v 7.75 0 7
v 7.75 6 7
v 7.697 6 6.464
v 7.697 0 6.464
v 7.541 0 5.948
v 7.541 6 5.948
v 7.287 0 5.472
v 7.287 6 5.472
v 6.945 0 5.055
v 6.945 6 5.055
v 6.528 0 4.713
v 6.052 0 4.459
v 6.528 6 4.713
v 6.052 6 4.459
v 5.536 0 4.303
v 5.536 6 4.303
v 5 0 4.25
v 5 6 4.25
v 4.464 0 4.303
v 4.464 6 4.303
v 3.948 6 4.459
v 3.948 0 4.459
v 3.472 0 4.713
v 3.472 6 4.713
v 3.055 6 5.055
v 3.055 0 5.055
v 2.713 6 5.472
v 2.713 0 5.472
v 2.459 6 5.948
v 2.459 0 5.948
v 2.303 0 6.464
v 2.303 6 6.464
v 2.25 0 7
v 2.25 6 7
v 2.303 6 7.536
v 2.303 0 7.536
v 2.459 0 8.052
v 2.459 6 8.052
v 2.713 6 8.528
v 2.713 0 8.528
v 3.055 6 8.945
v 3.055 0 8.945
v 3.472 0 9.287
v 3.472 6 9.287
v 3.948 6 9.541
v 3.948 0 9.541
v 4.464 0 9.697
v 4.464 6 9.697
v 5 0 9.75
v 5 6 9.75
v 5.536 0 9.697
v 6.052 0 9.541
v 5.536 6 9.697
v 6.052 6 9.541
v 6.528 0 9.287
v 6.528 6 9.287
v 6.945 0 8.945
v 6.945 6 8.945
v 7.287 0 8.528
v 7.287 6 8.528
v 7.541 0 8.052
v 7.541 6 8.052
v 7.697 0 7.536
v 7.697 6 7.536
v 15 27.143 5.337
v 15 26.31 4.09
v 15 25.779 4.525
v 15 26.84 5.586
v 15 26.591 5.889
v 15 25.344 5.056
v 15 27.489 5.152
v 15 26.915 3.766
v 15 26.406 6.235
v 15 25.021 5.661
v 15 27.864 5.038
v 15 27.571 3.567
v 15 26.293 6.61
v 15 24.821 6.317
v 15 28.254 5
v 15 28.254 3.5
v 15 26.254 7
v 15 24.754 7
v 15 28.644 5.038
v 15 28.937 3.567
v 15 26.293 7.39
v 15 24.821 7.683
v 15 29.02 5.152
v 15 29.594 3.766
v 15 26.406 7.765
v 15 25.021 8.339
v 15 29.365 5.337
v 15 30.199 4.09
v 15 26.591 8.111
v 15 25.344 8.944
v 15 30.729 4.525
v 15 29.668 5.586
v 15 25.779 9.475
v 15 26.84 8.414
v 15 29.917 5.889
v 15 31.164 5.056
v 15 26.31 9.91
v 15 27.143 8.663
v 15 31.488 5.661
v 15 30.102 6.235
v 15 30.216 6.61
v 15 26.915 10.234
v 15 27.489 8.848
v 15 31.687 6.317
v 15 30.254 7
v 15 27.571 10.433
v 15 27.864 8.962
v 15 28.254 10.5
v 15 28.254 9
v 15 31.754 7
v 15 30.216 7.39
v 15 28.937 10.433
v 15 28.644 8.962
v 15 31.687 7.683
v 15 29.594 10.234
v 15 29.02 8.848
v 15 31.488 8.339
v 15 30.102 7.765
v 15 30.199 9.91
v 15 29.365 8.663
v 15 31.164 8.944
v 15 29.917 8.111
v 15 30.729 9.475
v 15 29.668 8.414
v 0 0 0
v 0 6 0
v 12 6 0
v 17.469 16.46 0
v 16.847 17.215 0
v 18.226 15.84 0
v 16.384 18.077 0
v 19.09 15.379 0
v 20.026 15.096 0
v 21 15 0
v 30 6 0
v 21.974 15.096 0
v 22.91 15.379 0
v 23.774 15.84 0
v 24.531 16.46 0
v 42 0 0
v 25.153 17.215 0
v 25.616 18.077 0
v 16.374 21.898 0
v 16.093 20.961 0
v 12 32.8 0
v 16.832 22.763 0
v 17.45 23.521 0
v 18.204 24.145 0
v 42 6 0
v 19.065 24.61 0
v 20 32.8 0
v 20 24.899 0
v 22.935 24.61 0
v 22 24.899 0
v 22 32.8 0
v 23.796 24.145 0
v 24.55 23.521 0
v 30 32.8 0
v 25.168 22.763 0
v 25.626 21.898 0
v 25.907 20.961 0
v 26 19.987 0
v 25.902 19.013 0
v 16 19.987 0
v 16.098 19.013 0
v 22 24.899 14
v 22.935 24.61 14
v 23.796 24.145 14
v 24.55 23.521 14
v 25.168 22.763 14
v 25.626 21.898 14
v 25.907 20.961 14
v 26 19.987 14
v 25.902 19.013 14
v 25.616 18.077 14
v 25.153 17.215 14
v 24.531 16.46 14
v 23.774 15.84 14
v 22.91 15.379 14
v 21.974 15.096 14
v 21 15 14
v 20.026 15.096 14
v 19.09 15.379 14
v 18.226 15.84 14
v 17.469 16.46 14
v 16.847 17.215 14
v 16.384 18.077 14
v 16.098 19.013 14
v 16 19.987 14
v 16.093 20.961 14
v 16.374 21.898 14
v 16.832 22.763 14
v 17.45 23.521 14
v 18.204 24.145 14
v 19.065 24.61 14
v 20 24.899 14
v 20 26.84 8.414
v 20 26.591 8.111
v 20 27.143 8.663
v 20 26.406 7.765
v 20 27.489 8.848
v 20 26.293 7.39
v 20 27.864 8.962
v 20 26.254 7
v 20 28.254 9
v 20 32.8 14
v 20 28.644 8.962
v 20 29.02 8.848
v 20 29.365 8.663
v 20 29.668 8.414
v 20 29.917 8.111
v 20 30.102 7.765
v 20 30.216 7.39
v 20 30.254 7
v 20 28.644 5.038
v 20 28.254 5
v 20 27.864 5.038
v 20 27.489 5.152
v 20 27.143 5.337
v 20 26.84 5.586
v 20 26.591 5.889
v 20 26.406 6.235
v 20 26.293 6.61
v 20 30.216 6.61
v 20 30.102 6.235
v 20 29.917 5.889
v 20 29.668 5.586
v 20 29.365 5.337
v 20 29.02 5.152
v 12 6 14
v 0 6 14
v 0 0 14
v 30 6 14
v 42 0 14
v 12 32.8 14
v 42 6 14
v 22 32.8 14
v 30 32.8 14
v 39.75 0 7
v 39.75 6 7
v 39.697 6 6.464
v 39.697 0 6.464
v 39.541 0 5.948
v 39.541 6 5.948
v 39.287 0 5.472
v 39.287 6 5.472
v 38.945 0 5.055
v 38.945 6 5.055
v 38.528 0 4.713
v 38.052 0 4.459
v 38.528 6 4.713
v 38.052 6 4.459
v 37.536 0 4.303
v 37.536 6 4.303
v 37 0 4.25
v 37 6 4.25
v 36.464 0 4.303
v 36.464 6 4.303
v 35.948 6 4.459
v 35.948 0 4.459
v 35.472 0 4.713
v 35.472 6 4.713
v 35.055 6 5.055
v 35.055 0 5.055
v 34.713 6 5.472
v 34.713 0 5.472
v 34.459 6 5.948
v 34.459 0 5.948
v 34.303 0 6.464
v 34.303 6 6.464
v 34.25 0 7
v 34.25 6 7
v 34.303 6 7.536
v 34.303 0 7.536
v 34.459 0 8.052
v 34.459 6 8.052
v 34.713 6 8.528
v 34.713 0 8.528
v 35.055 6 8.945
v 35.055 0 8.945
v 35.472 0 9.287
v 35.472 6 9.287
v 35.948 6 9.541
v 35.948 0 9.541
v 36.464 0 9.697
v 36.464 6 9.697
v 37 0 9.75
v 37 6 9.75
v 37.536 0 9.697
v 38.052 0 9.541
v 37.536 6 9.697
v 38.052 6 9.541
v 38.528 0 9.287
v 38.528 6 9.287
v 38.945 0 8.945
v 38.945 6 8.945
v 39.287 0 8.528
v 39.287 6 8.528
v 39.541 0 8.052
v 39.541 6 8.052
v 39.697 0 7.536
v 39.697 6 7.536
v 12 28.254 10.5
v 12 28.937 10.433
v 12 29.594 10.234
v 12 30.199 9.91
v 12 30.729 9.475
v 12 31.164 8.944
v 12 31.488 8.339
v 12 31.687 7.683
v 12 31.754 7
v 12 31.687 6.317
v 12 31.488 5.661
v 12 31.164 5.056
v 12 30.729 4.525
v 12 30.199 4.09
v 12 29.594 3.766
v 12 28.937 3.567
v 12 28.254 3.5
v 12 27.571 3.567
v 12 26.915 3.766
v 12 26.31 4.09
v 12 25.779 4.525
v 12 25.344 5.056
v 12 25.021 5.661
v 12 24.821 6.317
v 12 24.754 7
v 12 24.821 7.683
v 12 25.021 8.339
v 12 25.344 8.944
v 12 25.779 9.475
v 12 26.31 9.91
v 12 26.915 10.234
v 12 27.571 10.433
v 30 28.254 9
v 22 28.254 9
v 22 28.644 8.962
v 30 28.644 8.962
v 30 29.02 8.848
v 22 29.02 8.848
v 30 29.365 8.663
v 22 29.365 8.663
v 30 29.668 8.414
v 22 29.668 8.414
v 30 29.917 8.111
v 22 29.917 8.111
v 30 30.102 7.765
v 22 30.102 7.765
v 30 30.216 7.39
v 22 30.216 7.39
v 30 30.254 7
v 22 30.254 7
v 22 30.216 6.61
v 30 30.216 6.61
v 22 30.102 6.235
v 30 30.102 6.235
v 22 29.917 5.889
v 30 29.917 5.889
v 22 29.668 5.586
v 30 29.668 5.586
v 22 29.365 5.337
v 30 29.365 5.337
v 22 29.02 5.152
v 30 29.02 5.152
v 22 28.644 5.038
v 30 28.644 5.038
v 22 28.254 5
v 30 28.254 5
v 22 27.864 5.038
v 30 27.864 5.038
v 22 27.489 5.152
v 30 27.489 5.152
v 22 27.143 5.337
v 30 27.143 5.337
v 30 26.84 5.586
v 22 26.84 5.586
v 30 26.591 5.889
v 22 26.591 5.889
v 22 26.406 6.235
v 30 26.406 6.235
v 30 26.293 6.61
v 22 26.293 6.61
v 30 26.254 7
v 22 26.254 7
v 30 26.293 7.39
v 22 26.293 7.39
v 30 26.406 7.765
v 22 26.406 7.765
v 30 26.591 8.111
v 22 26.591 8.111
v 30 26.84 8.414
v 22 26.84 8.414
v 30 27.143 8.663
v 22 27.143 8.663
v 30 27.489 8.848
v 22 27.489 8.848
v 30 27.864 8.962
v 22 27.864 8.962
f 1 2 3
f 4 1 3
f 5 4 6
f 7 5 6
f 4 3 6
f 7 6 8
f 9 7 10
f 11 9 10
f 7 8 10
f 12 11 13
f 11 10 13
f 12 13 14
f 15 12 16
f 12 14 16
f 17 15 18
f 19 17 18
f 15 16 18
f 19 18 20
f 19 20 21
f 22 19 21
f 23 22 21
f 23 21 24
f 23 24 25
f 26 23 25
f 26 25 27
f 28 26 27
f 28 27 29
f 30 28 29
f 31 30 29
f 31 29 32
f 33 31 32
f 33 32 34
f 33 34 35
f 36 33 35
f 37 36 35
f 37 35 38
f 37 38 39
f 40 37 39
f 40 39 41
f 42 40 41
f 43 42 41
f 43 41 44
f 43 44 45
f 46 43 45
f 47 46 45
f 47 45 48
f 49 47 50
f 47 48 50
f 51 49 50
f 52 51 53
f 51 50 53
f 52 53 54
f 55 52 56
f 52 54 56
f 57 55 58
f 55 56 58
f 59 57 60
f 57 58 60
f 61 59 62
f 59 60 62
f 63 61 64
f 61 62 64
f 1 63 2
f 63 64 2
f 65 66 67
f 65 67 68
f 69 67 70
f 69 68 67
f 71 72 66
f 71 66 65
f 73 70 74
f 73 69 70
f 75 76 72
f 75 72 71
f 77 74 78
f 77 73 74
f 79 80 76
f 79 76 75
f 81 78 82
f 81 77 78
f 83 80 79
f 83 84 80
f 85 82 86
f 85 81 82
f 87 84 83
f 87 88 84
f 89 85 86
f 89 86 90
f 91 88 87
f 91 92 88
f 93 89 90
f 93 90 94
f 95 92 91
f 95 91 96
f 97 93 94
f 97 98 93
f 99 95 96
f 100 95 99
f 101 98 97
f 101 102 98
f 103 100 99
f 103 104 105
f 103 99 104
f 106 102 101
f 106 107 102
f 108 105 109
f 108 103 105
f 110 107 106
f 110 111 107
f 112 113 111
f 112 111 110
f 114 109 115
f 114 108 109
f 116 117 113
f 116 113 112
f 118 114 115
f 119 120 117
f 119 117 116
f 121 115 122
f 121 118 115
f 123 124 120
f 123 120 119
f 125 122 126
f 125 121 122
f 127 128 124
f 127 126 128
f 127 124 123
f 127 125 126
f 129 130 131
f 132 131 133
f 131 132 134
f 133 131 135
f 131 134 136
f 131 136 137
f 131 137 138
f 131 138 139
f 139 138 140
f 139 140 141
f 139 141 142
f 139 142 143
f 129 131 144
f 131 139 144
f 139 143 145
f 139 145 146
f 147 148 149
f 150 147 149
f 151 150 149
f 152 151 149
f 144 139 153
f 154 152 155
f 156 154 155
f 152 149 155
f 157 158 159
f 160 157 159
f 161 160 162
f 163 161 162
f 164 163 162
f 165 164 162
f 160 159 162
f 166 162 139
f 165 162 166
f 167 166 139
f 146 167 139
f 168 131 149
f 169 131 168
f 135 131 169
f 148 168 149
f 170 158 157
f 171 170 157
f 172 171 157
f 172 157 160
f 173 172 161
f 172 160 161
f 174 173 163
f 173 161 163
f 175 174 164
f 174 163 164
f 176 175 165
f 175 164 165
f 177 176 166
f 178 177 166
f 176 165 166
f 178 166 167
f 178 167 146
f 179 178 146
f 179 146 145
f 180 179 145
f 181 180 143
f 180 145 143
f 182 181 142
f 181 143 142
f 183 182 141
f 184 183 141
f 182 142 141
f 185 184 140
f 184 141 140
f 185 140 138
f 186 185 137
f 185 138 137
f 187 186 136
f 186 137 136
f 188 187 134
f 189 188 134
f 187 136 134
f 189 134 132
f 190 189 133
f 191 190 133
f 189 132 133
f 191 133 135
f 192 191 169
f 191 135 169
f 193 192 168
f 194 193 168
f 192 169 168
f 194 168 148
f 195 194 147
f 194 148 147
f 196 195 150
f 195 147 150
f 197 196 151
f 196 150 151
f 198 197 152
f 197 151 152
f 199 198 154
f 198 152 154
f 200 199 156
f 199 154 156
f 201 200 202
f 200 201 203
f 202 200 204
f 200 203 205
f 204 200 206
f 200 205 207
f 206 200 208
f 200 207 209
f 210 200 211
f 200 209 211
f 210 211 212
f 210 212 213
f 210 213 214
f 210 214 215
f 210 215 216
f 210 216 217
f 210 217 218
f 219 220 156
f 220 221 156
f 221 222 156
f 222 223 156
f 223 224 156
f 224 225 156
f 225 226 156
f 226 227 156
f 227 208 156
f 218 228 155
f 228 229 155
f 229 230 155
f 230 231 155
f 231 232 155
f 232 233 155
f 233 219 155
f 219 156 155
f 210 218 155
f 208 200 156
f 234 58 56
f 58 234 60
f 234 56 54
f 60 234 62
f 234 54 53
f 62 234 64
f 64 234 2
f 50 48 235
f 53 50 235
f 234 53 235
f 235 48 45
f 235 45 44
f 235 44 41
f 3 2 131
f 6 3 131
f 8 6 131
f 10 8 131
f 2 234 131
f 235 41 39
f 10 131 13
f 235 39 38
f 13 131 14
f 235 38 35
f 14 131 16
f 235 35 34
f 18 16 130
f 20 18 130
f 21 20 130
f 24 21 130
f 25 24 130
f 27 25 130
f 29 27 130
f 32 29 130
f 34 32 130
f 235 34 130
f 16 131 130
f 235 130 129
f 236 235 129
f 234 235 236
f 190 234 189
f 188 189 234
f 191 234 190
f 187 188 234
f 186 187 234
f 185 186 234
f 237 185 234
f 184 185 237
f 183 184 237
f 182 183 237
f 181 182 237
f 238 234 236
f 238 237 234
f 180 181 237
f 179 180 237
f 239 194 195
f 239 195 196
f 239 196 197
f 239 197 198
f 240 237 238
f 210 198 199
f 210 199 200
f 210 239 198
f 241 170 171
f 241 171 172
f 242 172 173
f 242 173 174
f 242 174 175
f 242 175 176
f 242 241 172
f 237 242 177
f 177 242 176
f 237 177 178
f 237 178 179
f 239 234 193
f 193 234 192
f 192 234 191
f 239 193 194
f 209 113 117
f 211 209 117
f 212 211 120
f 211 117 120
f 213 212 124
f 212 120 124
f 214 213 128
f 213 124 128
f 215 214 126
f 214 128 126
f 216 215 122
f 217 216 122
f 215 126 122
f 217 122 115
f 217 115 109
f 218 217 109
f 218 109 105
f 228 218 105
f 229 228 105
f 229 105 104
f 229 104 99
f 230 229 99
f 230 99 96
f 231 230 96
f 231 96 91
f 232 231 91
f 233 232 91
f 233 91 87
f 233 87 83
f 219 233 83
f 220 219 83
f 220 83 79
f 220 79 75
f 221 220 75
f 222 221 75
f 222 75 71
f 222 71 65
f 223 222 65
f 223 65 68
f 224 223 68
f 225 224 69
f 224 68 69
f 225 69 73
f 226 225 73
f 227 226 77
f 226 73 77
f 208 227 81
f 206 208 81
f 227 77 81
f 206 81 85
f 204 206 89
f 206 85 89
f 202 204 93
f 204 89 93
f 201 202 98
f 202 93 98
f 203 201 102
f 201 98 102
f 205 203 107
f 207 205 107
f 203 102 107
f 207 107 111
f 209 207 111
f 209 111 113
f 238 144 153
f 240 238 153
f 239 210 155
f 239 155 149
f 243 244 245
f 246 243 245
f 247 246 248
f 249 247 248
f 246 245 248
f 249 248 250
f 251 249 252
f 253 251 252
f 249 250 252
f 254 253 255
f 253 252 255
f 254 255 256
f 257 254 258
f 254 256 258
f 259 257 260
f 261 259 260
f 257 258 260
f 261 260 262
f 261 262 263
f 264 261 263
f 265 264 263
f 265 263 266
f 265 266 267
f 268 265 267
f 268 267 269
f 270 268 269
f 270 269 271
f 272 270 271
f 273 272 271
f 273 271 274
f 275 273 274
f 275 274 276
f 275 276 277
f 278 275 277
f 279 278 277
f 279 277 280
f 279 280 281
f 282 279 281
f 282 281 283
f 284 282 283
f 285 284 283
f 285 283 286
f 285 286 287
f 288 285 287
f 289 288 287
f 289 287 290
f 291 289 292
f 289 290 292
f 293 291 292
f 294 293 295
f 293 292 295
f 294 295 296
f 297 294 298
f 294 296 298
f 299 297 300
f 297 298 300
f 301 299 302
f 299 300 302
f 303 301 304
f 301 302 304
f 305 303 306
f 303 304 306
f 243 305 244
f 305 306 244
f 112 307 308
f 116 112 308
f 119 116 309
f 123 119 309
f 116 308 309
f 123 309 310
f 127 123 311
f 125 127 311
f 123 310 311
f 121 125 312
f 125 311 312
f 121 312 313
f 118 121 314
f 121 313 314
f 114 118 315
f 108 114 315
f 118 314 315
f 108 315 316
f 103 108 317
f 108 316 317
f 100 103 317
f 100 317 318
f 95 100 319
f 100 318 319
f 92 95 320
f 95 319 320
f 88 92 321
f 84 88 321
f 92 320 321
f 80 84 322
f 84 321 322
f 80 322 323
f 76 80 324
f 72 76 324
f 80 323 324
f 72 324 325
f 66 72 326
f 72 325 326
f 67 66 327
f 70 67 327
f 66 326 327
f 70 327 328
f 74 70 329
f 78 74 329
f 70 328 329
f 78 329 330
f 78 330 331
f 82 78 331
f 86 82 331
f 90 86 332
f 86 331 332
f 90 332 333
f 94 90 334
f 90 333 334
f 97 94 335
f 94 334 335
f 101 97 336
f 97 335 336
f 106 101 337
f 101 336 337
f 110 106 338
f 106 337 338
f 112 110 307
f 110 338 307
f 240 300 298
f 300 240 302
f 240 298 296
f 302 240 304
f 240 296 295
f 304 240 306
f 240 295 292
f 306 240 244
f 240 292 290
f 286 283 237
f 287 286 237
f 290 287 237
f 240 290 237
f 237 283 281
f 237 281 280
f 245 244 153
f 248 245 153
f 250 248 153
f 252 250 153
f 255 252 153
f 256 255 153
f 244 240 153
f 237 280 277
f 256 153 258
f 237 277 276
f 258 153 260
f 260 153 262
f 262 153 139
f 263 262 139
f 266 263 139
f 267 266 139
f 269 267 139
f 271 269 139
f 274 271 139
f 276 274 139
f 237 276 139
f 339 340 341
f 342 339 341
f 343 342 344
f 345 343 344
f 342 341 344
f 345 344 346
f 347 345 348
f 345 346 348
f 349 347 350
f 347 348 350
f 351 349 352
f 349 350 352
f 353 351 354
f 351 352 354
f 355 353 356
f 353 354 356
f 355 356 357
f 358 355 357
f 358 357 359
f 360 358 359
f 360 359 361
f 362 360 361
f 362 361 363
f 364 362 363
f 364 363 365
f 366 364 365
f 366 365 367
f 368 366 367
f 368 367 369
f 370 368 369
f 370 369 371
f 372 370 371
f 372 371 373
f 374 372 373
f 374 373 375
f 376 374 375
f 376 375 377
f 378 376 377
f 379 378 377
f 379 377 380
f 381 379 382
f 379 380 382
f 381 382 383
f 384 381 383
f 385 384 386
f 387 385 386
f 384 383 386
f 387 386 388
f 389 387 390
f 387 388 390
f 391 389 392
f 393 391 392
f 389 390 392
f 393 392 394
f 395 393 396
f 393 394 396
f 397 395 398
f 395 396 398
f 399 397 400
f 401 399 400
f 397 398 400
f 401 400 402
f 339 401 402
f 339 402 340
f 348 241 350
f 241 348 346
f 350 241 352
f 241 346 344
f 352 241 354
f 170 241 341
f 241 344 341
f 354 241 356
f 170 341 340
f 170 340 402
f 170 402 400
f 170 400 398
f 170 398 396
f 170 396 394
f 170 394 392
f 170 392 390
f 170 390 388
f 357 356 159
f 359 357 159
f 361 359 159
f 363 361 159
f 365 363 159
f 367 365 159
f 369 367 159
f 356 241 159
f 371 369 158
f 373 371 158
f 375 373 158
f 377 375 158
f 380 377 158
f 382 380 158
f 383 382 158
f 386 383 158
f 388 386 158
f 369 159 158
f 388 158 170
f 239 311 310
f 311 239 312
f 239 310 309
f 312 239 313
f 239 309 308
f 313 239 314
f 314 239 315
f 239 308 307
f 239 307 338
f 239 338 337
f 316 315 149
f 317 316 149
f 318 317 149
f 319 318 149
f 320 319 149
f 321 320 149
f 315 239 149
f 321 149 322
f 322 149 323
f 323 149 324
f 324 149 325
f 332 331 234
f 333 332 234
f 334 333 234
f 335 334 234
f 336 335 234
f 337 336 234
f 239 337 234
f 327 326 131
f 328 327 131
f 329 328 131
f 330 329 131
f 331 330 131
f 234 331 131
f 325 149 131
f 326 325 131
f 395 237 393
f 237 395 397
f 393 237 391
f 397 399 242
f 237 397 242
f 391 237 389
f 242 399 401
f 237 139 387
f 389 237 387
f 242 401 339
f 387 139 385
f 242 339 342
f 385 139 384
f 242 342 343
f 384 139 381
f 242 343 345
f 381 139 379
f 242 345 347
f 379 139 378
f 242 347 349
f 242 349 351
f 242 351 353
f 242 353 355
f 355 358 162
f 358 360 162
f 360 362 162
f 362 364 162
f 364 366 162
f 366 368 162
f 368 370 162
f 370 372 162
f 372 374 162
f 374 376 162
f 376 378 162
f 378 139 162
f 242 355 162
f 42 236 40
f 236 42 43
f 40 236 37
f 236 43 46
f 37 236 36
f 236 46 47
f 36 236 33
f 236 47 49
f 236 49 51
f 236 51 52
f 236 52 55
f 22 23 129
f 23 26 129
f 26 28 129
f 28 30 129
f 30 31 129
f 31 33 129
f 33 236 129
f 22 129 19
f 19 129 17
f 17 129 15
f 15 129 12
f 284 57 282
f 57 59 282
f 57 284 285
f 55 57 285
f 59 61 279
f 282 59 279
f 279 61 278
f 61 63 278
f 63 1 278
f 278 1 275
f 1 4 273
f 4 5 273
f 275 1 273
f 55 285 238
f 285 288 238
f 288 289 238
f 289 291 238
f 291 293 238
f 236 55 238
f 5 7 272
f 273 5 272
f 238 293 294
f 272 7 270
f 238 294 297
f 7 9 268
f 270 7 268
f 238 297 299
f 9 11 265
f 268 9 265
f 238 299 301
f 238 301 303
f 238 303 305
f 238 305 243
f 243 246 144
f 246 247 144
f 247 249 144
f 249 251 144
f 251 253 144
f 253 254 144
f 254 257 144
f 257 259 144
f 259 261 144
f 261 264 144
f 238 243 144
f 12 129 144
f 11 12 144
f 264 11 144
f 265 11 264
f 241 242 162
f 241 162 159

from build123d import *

# Parameters (mm, degrees)
BOSS_EXTRUDE1_DEPTH = 14
SKETCH2_R           = 2.75
CUT_EXTRUDE1_DEPTH  = 7
SKETCH3_R           = 2
CUT_EXTRUDE2_DEPTH  = 31
SKETCH4_R           = 3.5
CUT_EXTRUDE3_DEPTH  = 3


with BuildPart() as part:
    # Sketch1 → Boss-Extrude1 (new body)
    with BuildSketch(Plane.XY):
        with BuildLine():
            Line((0, 0), (42, 0))
            Line((42, 0), (42, 6))
            Line((42, 6), (30, 6))
            Line((30, 6), (30, 32.8))
            Line((30, 32.8), (22, 32.8))
            Line((22, 32.8), (22, 24.898979486))
            ThreePointArc((22, 24.898979486), (21, 15), (20, 24.898979486))
            Line((20, 24.898979486), (20, 32.8))
            Line((20, 32.8), (12, 32.8))
            Line((12, 32.8), (12, 6))
            Line((12, 6), (0, 6))
            Line((0, 6), (0, 0))
        make_face()
    extrude(amount=BOSS_EXTRUDE1_DEPTH)

    # Sketch2 → Cut-Extrude1 (cut, through all)
    with BuildSketch(Plane(origin=(0, 6, 0), x_dir=(1, 0, 0), z_dir=(0, 1, 0))):
        with Locations((5, -7)):
            Circle(SKETCH2_R)
        with Locations((37, -7)):
            Circle(SKETCH2_R)
    extrude(amount=-CUT_EXTRUDE1_DEPTH, mode=Mode.SUBTRACT)

    # Sketch3 → Cut-Extrude2 (cut, through all)
    with BuildSketch(Plane.ZY.offset(-12)):
        with Locations((7, 28.254234055)):
            Circle(SKETCH3_R)
    extrude(amount=-CUT_EXTRUDE2_DEPTH, mode=Mode.SUBTRACT)

    # Sketch4 → Cut-Extrude3 (cut)
    with BuildSketch(Plane.ZY.offset(-12)):
        with Locations((7, 28.254234055)):
            Circle(SKETCH4_R)
    extrude(amount=-CUT_EXTRUDE3_DEPTH, mode=Mode.SUBTRACT)


solid = part.part
